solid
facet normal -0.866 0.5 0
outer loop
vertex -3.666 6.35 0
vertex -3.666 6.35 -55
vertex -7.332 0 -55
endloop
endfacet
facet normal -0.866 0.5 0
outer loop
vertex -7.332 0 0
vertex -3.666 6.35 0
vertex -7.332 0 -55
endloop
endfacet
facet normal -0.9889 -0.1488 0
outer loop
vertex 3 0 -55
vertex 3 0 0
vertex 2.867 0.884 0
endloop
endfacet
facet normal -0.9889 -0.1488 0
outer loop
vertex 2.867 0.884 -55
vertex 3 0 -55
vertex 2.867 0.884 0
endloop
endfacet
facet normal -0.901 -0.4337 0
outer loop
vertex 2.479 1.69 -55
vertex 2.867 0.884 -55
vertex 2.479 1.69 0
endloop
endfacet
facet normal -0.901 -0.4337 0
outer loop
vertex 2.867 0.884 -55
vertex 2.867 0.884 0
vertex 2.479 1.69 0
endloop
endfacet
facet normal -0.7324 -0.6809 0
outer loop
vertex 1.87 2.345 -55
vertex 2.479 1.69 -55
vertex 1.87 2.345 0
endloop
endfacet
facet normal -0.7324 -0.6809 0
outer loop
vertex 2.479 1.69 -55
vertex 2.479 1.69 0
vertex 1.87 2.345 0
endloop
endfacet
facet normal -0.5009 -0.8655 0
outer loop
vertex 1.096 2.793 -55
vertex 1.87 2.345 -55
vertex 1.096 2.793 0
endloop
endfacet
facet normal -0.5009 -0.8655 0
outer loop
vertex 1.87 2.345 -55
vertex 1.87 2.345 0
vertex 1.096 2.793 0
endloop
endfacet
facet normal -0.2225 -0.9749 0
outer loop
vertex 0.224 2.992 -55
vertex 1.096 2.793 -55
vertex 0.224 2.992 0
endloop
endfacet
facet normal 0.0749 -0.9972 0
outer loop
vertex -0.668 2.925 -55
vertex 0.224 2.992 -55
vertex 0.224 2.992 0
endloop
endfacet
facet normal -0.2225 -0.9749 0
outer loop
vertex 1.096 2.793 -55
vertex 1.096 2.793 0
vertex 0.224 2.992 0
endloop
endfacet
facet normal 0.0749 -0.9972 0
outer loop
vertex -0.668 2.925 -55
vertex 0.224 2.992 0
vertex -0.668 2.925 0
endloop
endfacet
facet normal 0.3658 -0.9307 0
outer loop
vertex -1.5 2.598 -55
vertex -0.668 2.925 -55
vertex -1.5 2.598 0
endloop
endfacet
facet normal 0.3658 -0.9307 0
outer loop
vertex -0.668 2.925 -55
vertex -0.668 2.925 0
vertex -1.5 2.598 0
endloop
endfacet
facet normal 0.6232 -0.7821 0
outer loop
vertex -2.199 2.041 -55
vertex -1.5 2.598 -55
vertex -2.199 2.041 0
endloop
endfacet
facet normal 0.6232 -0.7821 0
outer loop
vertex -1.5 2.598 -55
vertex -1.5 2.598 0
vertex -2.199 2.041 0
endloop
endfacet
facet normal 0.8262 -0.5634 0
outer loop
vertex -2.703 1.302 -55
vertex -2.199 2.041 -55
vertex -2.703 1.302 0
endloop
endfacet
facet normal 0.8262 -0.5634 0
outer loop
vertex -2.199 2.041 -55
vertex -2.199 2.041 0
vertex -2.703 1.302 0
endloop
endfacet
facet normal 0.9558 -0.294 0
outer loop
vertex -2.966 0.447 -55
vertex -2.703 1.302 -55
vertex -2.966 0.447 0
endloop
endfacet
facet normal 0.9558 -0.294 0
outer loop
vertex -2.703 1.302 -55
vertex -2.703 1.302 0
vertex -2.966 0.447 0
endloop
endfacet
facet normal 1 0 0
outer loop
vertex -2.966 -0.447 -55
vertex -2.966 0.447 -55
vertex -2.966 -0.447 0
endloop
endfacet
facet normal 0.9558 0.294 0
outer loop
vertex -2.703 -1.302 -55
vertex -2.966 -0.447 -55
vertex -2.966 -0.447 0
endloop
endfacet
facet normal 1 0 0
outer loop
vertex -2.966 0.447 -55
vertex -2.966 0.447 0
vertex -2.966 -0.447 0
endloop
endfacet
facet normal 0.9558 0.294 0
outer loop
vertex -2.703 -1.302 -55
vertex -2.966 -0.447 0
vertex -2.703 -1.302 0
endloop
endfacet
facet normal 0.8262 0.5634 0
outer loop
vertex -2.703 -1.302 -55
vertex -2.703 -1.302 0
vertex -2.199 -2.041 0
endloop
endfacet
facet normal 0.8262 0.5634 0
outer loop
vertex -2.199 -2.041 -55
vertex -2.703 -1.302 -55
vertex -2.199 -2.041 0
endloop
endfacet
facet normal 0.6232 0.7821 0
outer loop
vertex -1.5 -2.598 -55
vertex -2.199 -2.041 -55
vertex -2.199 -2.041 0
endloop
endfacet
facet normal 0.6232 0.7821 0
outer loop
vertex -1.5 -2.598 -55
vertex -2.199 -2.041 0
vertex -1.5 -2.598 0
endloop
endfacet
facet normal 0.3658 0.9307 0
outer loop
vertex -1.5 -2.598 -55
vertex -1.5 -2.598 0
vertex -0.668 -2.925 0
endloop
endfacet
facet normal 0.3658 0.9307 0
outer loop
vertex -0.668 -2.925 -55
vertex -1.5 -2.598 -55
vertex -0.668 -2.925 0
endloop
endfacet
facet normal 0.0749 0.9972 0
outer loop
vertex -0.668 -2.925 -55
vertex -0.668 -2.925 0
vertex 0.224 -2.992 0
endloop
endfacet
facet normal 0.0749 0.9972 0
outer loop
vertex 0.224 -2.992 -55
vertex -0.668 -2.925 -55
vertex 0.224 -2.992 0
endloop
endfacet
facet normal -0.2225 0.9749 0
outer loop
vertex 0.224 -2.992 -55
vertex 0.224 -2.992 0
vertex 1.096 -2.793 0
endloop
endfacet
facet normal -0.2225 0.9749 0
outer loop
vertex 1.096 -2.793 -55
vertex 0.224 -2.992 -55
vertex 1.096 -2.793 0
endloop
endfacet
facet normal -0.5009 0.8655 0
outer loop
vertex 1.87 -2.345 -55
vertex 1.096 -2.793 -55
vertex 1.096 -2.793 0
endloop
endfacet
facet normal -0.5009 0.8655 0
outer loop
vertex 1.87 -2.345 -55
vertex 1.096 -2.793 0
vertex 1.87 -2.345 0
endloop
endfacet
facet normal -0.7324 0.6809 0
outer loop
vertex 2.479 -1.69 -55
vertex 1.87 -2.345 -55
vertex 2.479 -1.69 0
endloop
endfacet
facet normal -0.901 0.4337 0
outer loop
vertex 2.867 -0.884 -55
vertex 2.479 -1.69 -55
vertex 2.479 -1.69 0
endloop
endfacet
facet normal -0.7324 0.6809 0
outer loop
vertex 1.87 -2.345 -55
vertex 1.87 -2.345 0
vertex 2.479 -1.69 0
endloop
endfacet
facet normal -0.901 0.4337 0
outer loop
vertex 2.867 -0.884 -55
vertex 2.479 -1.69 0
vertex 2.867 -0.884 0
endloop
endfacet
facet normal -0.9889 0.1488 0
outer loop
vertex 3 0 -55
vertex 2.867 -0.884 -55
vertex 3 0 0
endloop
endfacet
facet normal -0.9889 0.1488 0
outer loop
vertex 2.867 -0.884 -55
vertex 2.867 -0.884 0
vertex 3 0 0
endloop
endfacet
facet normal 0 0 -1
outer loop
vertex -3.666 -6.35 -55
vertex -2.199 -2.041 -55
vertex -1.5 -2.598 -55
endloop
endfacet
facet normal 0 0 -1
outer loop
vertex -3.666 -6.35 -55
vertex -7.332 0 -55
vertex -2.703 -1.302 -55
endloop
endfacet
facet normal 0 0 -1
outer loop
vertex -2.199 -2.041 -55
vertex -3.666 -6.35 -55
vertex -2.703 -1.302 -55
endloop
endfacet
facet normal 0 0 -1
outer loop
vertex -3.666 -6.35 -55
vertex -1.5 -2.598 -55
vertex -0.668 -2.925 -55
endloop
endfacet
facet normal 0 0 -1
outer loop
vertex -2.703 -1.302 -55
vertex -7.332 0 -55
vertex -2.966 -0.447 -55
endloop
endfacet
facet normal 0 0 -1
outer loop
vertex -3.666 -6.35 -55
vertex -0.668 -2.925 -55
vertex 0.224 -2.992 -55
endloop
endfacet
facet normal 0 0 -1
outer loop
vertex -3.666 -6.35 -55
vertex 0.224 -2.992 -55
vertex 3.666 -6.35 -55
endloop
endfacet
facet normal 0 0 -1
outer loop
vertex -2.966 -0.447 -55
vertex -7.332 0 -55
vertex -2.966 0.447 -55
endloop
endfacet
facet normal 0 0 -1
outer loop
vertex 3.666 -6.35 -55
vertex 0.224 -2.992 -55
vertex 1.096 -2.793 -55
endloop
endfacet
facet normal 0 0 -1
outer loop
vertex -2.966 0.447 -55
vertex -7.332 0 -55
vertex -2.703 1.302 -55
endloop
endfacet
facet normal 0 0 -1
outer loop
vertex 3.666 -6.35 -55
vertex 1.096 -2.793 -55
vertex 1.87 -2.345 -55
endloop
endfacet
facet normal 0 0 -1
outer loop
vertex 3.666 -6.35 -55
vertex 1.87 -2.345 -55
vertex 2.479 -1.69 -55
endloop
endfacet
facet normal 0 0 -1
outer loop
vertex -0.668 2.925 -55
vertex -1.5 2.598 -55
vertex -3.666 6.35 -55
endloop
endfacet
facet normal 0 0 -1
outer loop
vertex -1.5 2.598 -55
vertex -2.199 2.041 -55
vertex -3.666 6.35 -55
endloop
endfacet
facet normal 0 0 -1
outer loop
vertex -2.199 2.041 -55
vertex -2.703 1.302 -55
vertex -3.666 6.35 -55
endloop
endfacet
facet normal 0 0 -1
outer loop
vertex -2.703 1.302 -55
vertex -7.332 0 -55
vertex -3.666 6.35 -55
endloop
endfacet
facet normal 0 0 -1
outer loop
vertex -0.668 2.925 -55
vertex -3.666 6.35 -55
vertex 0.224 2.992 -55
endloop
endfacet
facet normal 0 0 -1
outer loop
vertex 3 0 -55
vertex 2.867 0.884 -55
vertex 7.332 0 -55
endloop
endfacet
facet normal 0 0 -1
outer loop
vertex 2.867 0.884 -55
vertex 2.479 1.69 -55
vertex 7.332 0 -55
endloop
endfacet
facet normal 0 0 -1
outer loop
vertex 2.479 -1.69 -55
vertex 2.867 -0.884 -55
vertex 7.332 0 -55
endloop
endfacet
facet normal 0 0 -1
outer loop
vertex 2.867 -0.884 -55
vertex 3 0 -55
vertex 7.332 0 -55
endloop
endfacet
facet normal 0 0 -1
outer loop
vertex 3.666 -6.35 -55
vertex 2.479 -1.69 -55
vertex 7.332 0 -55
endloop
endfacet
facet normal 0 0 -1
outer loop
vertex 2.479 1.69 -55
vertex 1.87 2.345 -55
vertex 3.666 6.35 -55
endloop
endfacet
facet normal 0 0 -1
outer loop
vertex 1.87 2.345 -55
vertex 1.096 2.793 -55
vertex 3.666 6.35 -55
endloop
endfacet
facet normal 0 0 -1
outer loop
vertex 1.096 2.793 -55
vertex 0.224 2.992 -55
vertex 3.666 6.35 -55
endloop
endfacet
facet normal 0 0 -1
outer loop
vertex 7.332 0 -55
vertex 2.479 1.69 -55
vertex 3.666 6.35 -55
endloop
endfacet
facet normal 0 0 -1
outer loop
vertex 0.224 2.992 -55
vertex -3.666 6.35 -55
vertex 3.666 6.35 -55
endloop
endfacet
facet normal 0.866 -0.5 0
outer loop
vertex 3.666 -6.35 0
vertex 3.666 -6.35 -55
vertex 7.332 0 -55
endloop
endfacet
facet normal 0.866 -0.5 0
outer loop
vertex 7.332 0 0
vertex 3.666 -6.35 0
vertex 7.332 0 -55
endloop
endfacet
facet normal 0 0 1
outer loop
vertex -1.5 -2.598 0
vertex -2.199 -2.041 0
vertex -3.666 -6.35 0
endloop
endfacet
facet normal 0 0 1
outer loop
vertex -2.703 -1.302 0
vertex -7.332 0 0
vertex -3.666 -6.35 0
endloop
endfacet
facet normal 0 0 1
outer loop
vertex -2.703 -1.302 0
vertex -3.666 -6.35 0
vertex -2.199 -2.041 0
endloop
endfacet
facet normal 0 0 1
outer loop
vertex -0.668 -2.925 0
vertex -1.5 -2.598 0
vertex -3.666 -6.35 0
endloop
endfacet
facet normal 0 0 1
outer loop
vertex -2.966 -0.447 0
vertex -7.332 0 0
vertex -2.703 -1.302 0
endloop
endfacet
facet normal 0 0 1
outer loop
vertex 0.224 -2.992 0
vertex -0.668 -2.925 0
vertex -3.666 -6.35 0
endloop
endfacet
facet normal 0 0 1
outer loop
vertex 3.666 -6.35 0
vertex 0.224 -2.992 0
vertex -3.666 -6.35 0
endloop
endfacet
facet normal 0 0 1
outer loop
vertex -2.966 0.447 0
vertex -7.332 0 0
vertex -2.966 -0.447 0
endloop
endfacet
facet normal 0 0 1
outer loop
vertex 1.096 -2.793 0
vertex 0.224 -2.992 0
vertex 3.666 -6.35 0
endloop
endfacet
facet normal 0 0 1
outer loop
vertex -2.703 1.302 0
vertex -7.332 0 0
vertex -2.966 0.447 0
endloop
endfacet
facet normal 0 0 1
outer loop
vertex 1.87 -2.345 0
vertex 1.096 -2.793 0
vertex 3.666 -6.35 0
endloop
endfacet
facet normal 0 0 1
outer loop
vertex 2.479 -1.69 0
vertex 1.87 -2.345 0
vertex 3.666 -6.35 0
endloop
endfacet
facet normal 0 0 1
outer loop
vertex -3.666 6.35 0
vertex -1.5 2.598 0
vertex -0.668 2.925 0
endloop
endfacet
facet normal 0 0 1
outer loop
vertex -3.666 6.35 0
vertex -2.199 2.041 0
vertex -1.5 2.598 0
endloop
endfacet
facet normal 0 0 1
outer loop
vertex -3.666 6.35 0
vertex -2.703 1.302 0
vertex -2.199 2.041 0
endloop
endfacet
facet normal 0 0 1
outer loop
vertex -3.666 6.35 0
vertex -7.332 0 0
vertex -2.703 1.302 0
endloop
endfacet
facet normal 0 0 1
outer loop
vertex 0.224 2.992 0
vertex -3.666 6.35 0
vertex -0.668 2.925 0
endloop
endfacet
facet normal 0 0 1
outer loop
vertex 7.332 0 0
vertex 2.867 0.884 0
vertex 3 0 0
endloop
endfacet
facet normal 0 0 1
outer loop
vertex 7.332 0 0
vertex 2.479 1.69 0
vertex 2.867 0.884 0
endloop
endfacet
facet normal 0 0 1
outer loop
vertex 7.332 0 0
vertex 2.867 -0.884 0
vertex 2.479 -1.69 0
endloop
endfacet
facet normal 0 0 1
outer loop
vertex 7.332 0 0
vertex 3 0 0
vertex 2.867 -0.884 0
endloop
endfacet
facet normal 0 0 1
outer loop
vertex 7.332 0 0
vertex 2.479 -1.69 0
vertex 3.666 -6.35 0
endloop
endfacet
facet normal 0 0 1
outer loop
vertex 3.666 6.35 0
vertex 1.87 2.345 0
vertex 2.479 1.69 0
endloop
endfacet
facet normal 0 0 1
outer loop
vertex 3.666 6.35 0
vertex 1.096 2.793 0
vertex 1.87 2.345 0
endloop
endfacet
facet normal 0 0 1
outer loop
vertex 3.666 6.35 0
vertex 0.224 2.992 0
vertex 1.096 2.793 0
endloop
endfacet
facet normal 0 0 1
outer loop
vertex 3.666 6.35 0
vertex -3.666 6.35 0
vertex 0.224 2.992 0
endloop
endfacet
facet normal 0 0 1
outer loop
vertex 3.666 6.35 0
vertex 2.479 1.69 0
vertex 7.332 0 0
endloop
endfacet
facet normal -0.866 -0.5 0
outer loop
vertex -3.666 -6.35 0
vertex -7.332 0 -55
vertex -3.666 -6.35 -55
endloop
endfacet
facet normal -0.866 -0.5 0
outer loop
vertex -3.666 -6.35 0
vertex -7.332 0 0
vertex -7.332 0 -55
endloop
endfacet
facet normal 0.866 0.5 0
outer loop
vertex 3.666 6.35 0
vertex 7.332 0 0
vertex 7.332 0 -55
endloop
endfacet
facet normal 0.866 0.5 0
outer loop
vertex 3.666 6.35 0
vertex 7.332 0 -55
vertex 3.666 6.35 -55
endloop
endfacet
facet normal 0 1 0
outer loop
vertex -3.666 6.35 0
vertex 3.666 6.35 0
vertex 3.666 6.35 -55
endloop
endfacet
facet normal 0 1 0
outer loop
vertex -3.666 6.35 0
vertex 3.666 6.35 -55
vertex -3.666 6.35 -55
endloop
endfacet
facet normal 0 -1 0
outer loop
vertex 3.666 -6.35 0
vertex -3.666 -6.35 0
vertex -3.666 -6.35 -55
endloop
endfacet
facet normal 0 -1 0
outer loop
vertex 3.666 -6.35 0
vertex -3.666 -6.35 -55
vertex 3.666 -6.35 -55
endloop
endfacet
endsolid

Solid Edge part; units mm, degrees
sketch "Sketch1" plane through (0, 0, 0) normal (0, 0, 1) x (1, 0, 0)
  line L0 (7.3323, 0) -> (3.6662, 6.35)
  line L1 (3.6662, 6.35) -> (-3.6662, 6.35)
  line L2 (-3.6662, 6.35) -> (-7.3323, 0)
  line L3 (-7.3323, 0) -> (-3.6662, -6.35)
  line L4 (-3.6662, -6.35) -> (3.6662, -6.35)
  line L5 (3.6662, -6.35) -> (7.3323, 0)
  circle A0 centre (0, 0) radius 3
  dimension "D1" = 12.7
  dimension "D2" = 6
extrude "Protrusion1" add sketch "Sketch1" against normal blind 55
properties part number "BumbleB0520"
